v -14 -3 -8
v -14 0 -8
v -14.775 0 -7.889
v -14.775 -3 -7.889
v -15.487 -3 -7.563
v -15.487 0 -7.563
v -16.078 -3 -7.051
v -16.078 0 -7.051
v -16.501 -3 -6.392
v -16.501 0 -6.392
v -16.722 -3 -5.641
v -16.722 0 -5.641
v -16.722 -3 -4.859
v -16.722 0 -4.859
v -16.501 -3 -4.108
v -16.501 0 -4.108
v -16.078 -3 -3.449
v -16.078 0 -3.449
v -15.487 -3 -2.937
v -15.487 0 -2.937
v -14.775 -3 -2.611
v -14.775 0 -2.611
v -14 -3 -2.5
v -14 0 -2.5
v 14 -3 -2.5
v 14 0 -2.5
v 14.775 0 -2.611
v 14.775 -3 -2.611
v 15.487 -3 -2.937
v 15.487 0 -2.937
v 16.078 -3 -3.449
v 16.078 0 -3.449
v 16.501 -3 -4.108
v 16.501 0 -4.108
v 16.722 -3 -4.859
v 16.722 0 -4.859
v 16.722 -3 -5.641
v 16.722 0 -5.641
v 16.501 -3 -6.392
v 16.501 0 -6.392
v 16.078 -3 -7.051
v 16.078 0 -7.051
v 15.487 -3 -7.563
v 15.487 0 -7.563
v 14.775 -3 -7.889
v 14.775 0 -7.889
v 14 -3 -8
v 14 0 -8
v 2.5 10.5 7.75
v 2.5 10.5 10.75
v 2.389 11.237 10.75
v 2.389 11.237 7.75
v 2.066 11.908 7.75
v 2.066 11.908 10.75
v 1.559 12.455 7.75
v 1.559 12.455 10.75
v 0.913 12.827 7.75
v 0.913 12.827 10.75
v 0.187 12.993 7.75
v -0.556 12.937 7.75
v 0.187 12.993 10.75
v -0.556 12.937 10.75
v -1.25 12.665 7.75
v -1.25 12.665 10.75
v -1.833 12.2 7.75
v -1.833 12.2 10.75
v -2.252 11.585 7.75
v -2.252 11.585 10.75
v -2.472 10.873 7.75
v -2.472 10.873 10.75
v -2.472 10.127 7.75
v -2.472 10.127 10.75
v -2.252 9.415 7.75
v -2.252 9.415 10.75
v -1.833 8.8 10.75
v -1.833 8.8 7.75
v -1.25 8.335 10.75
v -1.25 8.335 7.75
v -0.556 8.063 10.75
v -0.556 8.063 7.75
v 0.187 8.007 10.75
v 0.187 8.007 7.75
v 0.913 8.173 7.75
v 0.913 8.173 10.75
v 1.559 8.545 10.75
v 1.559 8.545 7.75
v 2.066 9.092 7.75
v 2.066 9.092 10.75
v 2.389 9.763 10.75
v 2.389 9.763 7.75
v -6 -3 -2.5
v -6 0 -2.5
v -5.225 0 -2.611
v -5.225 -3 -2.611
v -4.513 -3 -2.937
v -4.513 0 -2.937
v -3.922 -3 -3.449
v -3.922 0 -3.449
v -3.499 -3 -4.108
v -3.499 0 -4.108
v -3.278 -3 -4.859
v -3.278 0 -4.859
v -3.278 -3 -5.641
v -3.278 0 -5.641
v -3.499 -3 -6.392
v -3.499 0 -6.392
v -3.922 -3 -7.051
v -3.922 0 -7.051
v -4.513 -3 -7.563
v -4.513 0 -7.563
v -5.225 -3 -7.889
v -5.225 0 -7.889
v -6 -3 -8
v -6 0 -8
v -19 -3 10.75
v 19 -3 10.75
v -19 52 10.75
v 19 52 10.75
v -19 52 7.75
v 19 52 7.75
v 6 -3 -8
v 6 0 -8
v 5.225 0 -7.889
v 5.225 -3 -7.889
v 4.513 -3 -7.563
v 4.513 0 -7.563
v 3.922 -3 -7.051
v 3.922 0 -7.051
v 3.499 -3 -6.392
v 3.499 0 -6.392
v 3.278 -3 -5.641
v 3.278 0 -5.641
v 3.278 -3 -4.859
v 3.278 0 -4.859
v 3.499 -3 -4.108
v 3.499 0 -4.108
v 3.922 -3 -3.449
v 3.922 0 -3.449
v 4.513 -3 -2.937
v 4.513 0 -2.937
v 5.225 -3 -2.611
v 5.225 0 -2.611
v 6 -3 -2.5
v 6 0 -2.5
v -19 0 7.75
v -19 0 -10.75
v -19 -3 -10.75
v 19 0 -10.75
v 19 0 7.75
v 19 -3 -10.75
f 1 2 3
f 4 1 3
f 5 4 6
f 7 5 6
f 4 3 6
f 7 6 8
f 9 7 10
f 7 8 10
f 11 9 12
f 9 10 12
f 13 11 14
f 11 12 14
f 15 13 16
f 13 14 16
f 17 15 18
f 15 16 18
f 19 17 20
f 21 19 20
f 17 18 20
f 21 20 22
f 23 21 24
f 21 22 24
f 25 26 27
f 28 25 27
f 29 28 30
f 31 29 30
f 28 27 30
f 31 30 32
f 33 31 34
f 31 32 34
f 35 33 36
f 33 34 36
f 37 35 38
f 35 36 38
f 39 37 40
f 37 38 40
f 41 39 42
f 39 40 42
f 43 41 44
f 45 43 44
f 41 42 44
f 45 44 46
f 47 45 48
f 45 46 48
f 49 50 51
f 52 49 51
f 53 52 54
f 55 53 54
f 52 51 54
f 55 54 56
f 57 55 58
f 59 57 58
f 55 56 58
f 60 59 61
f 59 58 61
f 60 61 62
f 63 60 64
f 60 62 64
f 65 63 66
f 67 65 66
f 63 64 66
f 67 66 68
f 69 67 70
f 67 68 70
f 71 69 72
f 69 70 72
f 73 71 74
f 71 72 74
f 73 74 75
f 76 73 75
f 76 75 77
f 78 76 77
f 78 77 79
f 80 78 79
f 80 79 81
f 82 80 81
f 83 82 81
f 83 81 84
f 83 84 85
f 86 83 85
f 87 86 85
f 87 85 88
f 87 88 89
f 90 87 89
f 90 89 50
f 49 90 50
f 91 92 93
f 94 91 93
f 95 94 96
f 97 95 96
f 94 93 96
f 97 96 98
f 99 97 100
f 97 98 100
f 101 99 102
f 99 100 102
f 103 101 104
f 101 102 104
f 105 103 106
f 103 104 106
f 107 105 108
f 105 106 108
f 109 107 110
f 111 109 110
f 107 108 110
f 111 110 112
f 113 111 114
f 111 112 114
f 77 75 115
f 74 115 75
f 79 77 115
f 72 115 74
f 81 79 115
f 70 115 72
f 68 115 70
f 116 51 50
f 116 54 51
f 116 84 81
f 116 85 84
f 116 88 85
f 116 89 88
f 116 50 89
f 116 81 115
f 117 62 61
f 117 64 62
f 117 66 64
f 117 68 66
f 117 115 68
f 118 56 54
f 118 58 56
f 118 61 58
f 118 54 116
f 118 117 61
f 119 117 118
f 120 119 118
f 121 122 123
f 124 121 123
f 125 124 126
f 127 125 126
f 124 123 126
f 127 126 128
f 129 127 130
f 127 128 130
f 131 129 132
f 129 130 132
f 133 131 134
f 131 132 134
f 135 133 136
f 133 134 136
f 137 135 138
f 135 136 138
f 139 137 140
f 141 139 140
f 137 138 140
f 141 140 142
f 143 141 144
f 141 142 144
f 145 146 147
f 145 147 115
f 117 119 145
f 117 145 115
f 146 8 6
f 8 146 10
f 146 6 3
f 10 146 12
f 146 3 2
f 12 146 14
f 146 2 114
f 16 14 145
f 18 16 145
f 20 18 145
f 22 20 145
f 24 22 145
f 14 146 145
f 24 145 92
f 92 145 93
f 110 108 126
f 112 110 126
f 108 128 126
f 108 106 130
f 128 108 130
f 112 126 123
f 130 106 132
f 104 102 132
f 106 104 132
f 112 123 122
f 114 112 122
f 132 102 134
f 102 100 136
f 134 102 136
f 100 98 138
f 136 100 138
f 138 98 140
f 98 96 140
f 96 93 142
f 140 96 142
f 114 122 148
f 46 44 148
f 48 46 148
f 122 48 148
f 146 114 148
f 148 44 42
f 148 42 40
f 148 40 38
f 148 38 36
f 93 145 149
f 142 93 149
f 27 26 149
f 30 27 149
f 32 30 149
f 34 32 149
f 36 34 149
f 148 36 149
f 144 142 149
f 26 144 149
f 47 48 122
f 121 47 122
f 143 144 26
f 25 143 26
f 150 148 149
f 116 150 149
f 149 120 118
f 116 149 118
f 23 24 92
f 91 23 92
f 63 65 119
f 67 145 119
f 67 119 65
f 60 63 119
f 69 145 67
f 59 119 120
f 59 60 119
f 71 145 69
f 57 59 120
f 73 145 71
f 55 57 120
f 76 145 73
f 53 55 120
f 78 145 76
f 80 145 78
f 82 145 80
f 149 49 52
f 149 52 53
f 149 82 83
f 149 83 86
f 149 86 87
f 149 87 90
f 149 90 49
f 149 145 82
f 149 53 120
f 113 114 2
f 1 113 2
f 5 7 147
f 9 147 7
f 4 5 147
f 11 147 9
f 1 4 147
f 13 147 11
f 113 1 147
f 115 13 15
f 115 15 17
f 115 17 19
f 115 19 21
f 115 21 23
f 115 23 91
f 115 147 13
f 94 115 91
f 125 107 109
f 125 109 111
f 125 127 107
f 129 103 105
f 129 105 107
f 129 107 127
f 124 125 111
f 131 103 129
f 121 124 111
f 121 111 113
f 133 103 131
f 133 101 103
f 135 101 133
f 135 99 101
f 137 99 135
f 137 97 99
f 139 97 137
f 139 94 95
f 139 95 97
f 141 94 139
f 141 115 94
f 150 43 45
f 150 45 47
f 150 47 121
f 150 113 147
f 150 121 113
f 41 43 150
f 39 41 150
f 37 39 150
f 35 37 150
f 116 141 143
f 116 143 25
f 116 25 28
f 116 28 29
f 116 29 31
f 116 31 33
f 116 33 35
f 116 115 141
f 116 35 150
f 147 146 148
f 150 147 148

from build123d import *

# Parameters (mm, degrees)
F0_W     = 38
F0_H     = 21.5
F1_DEPTH = 3
F2_W     = 38
F2_H     = 3
F3_DEPTH = 55
F4_R     = 2.5
F5_DEPTH = 21.501


with BuildPart() as f1:
    # F0 (on Front) → F1 (new body)
    with BuildSketch(Plane.XZ):
        Rectangle(F0_W, F0_H)
        with BuildLine():
            ThreePointArc((-14, -8), (-16.75, -5.25), (-14, -2.5))
            Line((-14, -2.5), (-6, -2.5))
            ThreePointArc((-6, -2.5), (-3.25, -5.25), (-6, -8))
            Line((-6, -8), (-14, -8))
        make_face(mode=Mode.SUBTRACT)
        with BuildLine():
            Line((14, -8), (6, -8))
            ThreePointArc((6, -8), (3.25, -5.25), (6, -2.5))
            Line((6, -2.5), (14, -2.5))
            ThreePointArc((14, -2.5), (16.75, -5.25), (14, -8))
        make_face(mode=Mode.SUBTRACT)
    extrude(amount=F1_DEPTH)

    # F2 (on face) → F3 (join)
    with BuildSketch(Plane.XZ.offset(3)):
        with Locations((0, 9.25)):
            Rectangle(F2_W, F2_H)
    extrude(amount=-F3_DEPTH)

    # F4 (on face) → F5 (cut, through all)
    with BuildSketch(Plane.XY.offset(10.75)):
        with Locations((0, 10.5)):
            Circle(F4_R)
    extrude(amount=-F5_DEPTH, mode=Mode.SUBTRACT)


solid = f1.part
